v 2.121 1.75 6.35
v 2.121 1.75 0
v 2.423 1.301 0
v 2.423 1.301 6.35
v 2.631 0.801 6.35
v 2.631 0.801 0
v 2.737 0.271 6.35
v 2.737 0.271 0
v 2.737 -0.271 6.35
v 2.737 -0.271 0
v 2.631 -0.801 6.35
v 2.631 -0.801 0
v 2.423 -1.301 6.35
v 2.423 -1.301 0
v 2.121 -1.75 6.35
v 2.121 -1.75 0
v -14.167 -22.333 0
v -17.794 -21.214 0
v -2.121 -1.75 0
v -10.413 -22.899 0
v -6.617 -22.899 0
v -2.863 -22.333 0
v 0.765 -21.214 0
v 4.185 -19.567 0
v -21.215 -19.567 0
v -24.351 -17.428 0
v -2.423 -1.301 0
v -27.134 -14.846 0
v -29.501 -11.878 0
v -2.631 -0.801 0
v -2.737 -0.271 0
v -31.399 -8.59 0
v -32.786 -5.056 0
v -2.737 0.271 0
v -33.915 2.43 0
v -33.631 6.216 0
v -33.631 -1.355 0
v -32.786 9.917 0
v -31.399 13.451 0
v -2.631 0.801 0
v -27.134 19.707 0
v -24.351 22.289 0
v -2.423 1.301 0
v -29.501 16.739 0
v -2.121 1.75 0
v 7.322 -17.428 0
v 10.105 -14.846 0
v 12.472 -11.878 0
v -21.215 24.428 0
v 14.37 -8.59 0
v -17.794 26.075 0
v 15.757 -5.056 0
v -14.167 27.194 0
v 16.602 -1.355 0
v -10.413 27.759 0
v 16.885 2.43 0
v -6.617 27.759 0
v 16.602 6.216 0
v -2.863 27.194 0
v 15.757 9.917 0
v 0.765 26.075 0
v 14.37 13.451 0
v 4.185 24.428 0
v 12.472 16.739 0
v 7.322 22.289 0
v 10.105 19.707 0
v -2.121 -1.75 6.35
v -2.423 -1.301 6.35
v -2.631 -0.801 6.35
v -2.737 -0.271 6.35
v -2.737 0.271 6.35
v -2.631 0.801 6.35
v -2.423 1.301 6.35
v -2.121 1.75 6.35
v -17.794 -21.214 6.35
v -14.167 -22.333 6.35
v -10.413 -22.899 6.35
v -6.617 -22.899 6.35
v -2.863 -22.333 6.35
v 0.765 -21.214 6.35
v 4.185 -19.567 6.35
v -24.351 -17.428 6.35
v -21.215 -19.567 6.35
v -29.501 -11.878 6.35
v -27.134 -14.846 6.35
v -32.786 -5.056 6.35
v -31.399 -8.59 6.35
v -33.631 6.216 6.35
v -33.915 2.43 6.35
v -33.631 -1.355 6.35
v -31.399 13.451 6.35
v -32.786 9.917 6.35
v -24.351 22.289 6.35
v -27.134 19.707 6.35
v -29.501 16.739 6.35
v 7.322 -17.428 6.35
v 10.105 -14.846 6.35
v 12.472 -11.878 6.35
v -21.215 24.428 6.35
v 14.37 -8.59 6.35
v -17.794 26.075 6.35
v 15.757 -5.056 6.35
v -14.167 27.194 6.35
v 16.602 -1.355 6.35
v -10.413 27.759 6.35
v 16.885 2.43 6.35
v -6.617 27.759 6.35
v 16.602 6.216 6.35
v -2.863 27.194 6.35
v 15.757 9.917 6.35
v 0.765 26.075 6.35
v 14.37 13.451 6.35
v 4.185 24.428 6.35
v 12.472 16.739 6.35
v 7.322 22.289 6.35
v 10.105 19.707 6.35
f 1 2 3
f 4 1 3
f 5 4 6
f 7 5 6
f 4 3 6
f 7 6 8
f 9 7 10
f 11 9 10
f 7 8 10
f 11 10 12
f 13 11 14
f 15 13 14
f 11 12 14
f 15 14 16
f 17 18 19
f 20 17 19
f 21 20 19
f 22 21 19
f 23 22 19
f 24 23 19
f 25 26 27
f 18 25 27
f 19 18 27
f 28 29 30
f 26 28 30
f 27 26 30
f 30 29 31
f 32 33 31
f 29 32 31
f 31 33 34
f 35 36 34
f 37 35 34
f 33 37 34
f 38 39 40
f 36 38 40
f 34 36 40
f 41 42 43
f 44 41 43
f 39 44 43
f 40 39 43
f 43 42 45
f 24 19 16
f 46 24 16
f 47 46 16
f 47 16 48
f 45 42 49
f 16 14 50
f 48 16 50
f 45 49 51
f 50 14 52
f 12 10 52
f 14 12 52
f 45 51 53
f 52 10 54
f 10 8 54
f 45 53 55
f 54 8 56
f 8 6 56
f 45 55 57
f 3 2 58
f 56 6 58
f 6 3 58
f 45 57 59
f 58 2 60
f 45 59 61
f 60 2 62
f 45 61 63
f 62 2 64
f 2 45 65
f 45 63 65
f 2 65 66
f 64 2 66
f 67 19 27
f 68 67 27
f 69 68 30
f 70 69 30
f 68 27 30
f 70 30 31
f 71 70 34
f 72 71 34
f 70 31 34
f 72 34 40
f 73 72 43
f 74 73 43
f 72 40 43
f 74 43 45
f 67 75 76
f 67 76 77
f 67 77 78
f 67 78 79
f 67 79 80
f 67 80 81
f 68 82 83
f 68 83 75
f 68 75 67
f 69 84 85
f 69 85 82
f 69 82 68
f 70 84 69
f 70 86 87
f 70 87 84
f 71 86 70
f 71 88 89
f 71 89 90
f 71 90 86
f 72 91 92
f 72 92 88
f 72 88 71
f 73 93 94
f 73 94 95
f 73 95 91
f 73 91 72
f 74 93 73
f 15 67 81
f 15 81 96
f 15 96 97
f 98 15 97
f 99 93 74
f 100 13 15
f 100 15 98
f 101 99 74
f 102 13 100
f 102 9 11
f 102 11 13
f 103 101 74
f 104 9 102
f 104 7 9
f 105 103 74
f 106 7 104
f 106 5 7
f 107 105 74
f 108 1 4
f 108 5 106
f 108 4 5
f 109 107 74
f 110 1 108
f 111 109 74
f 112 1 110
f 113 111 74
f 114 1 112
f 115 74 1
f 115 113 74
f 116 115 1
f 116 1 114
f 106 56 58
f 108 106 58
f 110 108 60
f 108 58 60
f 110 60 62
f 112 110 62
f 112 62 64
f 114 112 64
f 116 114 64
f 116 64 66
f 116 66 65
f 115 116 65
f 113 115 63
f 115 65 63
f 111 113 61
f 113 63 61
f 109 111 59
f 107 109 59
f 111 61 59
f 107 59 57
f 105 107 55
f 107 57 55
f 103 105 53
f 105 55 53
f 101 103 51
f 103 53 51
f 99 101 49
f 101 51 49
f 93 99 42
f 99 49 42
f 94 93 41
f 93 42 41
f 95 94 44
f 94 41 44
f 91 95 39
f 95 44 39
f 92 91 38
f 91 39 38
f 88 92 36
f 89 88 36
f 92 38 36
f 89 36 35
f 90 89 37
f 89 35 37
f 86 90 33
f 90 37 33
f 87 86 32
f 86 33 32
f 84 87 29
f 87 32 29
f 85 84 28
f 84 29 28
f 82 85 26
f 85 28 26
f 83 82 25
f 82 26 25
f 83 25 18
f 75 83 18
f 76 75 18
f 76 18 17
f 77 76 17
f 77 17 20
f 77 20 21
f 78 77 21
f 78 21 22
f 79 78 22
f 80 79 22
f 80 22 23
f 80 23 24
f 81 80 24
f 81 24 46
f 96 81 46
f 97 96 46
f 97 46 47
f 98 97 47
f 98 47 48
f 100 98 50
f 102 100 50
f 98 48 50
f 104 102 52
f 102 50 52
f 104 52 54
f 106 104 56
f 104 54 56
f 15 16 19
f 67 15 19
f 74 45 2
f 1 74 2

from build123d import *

# Parameters (mm, degrees)
SKETCH1_R           = 25.4
BOSS_EXTRUDE1_DEPTH = 6.35


with BuildPart() as part:
    # Sketch1 → Boss-Extrude1 (new body)
    with BuildSketch(Plane.XY):
        with Locations((-8.514653882, 2.430473335)):
            Circle(SKETCH1_R)
        with BuildLine():
            Line((-2.121320344, 1.75), (2.121320344, 1.75))
            ThreePointArc((2.121320344, 1.75), (2.75, 0), (2.121320344, -1.75))
            Line((2.121320344, -1.75), (-2.121320344, -1.75))
            ThreePointArc((-2.121320344, -1.75), (-2.75, 0), (-2.121320344, 1.75))
        make_face(mode=Mode.SUBTRACT)
    extrude(amount=BOSS_EXTRUDE1_DEPTH)


solid = part.part
